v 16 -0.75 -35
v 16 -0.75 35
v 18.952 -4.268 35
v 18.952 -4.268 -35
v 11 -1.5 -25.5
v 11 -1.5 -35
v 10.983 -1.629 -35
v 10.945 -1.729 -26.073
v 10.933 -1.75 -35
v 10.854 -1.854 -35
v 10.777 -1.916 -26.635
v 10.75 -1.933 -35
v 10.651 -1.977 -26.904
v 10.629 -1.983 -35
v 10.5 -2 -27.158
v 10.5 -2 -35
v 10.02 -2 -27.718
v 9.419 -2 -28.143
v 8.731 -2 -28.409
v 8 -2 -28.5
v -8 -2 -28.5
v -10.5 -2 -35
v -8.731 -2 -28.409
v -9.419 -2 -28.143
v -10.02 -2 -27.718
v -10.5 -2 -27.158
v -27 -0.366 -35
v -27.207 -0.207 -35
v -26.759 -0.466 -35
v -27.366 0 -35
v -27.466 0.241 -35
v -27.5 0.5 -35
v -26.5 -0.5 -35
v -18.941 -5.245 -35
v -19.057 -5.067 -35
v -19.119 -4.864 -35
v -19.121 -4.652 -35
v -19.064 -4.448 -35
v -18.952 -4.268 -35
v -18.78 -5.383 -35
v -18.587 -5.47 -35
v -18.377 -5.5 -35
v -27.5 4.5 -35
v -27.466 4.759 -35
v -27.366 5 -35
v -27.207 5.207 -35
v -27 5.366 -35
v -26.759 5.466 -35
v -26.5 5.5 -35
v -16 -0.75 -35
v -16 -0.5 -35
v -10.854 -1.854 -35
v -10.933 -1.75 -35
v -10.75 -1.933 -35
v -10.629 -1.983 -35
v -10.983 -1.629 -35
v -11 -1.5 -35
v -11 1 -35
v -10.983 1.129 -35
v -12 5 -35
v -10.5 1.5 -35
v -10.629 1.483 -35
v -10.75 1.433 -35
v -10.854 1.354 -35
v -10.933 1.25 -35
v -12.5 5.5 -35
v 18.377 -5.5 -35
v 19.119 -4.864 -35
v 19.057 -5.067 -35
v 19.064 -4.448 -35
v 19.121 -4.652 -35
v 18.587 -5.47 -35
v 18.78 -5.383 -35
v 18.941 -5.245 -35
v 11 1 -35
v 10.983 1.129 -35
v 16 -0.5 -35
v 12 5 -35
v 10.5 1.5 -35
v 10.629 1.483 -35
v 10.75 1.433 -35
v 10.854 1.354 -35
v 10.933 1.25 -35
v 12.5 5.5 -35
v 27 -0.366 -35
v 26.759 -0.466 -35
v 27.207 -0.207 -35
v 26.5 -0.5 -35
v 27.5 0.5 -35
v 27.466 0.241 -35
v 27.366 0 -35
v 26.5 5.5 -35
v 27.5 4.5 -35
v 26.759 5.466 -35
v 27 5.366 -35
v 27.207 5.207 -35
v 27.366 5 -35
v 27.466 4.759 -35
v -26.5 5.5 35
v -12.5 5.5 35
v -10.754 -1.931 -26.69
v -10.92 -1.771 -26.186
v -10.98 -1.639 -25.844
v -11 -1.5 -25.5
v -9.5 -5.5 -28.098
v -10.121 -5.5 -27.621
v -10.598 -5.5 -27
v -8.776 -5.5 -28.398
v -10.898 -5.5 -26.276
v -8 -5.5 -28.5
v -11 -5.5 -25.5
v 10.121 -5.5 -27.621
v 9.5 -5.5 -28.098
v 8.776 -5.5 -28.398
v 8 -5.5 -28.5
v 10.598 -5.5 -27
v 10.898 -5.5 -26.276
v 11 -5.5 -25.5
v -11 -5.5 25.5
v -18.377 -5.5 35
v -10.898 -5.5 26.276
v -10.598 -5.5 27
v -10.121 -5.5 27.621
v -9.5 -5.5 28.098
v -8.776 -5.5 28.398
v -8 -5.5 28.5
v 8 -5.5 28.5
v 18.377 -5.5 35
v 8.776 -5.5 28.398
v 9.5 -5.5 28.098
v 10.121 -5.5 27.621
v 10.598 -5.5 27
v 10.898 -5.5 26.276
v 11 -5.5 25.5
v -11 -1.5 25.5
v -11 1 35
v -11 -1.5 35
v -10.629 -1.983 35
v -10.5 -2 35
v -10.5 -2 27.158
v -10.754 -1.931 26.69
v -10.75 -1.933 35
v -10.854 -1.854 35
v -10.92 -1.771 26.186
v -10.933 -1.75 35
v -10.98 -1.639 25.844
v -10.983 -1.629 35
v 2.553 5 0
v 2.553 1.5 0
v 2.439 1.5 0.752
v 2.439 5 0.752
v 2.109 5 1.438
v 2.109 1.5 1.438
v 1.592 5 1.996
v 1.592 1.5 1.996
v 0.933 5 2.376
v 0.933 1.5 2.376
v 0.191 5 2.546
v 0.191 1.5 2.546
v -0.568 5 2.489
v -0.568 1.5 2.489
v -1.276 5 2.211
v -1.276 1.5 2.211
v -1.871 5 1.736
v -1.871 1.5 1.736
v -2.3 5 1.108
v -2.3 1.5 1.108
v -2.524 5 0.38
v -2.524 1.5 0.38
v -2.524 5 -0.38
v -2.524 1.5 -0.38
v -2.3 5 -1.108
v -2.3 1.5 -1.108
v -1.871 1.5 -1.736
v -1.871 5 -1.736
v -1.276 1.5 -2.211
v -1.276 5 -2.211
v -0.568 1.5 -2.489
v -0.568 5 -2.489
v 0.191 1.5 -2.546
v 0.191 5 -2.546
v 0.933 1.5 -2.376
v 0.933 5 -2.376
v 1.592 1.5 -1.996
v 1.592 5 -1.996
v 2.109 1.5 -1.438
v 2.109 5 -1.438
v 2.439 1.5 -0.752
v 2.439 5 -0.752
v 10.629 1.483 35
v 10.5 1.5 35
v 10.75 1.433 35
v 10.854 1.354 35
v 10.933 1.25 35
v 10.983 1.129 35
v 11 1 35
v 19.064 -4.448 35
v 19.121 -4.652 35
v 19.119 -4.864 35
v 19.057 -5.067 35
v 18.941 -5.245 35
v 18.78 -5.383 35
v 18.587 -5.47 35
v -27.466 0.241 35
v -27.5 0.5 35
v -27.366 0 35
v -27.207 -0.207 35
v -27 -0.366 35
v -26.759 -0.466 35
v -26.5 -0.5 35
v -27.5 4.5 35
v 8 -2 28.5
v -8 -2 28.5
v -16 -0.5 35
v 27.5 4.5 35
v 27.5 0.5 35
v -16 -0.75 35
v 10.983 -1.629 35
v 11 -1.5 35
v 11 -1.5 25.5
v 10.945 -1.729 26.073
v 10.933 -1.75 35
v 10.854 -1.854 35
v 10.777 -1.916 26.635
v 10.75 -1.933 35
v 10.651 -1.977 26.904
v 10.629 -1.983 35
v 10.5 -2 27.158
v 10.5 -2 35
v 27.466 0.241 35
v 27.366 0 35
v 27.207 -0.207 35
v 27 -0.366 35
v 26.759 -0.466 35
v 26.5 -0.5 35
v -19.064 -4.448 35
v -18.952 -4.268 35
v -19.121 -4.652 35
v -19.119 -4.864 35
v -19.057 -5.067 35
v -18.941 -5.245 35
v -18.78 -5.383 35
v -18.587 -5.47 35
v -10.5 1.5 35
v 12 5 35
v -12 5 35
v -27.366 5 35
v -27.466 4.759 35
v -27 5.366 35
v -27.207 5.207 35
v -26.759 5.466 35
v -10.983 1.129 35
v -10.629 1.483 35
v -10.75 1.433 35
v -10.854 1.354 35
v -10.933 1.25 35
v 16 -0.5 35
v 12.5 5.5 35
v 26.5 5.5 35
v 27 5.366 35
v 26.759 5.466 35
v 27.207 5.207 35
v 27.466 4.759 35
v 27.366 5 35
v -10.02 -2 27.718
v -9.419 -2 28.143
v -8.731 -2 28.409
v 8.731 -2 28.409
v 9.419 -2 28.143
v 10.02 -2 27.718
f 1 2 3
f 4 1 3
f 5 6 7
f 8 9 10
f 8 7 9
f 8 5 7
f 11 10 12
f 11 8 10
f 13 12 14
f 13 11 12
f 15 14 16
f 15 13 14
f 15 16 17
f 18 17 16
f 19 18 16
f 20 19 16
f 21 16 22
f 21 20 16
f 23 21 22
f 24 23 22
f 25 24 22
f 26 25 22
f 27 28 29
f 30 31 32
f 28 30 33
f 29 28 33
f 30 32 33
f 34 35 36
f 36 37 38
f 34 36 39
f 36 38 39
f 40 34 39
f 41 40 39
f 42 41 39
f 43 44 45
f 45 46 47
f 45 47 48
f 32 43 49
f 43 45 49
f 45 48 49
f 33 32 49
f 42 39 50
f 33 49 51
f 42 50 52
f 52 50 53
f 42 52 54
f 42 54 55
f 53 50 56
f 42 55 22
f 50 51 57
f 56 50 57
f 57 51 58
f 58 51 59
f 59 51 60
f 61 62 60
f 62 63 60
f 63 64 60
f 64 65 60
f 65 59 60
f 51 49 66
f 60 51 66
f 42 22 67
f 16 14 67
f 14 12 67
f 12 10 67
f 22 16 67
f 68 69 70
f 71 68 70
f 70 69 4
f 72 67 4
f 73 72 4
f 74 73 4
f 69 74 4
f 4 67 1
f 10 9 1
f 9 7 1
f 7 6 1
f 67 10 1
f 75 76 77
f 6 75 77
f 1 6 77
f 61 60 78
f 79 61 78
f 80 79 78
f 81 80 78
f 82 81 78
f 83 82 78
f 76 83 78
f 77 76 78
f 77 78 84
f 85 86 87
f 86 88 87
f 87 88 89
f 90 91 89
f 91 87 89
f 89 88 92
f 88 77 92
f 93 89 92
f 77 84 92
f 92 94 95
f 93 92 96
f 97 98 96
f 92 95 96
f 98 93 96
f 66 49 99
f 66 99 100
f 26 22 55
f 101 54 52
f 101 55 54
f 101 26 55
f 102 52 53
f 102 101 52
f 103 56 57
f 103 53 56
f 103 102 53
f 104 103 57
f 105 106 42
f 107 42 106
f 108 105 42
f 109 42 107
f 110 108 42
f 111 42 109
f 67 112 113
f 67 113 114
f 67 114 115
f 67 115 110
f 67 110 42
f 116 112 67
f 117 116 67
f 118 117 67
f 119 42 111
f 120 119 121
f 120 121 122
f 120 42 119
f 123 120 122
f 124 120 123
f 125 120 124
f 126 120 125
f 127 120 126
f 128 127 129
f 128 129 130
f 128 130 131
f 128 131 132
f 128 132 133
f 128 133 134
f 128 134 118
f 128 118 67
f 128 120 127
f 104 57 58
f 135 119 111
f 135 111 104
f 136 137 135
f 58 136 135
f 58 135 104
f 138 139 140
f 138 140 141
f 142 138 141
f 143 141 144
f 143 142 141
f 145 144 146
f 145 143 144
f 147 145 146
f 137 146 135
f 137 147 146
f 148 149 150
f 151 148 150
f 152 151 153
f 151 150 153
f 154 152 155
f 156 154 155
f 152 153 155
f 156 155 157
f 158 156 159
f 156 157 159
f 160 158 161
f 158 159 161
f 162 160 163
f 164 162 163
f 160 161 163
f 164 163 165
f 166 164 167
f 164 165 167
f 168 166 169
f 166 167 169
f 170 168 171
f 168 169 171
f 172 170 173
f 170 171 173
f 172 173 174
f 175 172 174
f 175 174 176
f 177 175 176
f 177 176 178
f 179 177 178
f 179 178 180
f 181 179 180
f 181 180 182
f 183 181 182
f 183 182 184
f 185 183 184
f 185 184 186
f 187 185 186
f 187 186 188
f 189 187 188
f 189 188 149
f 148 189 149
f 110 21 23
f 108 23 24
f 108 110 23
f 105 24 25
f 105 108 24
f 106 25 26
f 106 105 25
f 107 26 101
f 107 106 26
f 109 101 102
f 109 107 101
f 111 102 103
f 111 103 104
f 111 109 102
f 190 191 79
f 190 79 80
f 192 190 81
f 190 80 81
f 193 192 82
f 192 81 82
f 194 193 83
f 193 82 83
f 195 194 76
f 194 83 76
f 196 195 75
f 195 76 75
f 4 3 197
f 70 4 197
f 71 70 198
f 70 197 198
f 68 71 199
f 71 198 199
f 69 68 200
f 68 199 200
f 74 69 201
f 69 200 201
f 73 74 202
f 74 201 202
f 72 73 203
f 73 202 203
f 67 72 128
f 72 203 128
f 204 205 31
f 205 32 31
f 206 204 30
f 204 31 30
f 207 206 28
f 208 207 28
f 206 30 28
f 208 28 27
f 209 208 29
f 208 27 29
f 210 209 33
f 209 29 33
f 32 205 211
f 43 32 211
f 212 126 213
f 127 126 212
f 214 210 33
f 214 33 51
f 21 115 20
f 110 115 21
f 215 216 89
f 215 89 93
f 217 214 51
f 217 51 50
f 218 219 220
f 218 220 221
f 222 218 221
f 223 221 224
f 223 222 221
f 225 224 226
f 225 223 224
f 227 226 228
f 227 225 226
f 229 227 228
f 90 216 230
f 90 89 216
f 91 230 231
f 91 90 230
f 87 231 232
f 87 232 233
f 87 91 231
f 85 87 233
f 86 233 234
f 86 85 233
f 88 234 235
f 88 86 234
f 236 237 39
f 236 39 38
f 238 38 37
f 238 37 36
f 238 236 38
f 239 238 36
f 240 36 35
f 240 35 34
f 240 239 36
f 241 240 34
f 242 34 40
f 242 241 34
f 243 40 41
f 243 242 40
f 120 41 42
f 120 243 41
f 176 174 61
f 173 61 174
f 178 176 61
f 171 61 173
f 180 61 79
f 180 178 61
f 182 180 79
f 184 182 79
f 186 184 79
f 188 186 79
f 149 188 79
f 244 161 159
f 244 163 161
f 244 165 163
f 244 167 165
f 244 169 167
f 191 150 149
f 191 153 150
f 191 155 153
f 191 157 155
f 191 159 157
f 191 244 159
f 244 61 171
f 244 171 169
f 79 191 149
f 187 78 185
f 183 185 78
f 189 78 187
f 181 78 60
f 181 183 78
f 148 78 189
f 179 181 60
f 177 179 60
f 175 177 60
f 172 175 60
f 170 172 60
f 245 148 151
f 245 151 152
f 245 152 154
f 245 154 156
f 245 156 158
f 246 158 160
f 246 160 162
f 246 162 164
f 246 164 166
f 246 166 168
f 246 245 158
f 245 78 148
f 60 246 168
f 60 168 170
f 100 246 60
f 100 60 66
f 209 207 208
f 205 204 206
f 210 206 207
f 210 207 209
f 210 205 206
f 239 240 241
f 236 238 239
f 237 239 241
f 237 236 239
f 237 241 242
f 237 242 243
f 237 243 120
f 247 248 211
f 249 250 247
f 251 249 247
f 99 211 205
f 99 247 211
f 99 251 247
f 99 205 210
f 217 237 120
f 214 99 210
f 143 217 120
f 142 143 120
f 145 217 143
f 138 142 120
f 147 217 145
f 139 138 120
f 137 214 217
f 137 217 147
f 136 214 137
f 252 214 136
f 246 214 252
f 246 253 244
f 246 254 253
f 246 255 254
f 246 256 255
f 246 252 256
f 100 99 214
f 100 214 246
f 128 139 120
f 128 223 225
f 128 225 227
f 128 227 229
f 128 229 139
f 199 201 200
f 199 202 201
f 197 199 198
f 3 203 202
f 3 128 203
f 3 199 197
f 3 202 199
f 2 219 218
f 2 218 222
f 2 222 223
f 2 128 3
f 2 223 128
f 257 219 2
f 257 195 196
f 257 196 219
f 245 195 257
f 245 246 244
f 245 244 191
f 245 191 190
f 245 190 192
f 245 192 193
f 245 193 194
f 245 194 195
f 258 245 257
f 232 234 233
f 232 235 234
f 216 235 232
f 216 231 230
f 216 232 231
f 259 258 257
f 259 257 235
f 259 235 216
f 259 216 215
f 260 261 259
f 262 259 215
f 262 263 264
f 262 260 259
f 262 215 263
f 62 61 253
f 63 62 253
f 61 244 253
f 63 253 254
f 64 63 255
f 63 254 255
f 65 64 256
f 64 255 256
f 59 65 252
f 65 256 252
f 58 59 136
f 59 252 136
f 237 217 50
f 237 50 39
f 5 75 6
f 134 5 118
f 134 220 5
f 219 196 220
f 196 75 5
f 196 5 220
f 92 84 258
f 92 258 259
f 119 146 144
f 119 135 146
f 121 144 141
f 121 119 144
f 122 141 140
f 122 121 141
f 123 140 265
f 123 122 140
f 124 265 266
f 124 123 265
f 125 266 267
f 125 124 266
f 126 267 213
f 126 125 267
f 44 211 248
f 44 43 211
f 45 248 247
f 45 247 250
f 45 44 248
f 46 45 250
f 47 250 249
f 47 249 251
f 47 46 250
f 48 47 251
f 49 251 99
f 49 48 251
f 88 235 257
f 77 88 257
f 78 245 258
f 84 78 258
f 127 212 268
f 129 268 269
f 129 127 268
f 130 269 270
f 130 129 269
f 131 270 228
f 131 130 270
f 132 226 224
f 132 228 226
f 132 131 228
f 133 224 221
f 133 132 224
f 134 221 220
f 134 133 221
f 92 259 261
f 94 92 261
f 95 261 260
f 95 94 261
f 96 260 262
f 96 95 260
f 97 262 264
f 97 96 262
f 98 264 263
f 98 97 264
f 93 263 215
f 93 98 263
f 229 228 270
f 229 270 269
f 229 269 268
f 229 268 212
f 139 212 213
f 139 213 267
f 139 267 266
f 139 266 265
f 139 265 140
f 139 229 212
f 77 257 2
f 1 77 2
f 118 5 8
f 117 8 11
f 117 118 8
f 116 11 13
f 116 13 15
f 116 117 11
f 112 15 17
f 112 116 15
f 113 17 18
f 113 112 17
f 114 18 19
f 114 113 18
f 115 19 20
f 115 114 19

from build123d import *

# Parameters (mm, degrees)
SKETCH1_W           = 55
SKETCH1_H           = 11
BOSS_EXTRUDE1_DEPTH = 35
CUT_EXTRUDE1_DEPTH  = 71
FILLET1_R           = 1
CUT_EXTRUDE2_DEPTH  = 71
CUT_EXTRUDE3_DEPTH  = 71
CUT_EXTRUDE4_DEPTH  = 7
FILLET2_R           = 0.5
SKETCH6_R           = 2.5527
CUT_EXTRUDE5_DEPTH  = 5


with BuildPart() as part:
    # Sketch1 → Boss-Extrude1 (new body, symmetric)
    with BuildSketch(Plane.XY):
        Rectangle(SKETCH1_W, SKETCH1_H)
    extrude(amount=BOSS_EXTRUDE1_DEPTH, both=True)

    # Sketch2 → Cut-Extrude1 (cut, through all)
    with BuildSketch(Plane.XY.offset(35)):
        with BuildLine():
            Line((-27.5, -0.5), (-16, -0.5))
            Line((-16, -0.5), (-16, -0.75))
            Line((-16, -0.75), (-18.95187639, -4.267909293))
            ThreePointArc((-18.95187639, -4.267909293), (-19.057073898, -5.066963696), (-18.377343058, -5.5))
            Line((-18.377343058, -5.5), (-27.5, -5.5))
            Line((-27.5, -5.5), (-27.5, -0.5))
        make_face()
    cut_extrude1 = extrude(amount=-CUT_EXTRUDE1_DEPTH, mode=Mode.SUBTRACT)

    # Mirror1: Cut-Extrude1 across plane
    add(cut_extrude1.mirror(Plane(origin=(0, 0, 0), x_dir=(0, 0, 1), z_dir=(1, 0, 0))), mode=Mode.SUBTRACT)

    # Fillet1
    fillet1_edges = [part.edges().sort_by_distance(p)[0] for p in [
        (-27.5, -0.5, 0),
        (27.5, -0.5, 0),
        (-27.5, 5.5, 0),
        (27.5, 5.5, 0),
    ]]
    fillet(fillet1_edges, radius=FILLET1_R)

    # Sketch3 → Cut-Extrude2 (cut, through all)
    with BuildSketch(Plane.XY.offset(35)):
        Polygon((-12.5, 5.5), (0, 5.5), (0, 5), (-12, 5), align=None)
    cut_extrude2 = extrude(amount=-CUT_EXTRUDE2_DEPTH, mode=Mode.SUBTRACT)

    # Mirror2: Cut-Extrude2 across plane
    add(cut_extrude2.mirror(Plane(origin=(0, 0, 0), x_dir=(0, 0, 1), z_dir=(1, 0, 0))), mode=Mode.SUBTRACT)

    # Sketch4 → Cut-Extrude3 (cut, through all)
    with BuildSketch(Plane.XY.offset(35)):
        with BuildLine():
            Line((-11, 1.5), (11, 1.5))
            Line((11, 1.5), (11, -1.5))
            ThreePointArc((11, -1.5), (10.853553391, -1.853553391), (10.5, -2))
            Line((10.5, -2), (-10.5, -2))
            ThreePointArc((-10.5, -2), (-10.853553391, -1.853553391), (-11, -1.5))
            Line((-11, -1.5), (-11, 1.5))
        make_face()
    extrude(amount=-CUT_EXTRUDE3_DEPTH, mode=Mode.SUBTRACT)

    # Sketch5 → Cut-Extrude4 (cut)
    with BuildSketch(Plane.XZ.offset(5.5)):
        with BuildLine():
            Line((-8, 28.5), (8, 28.5))
            ThreePointArc((8, 28.5), (10.121320344, 27.621320344), (11, 25.5))
            Line((11, 25.5), (11, -25.5))
            ThreePointArc((11, -25.5), (10.121320344, -27.621320344), (8, -28.5))
            Line((8, -28.5), (-8, -28.5))
            ThreePointArc((-8, -28.5), (-10.121320344, -27.621320344), (-11, -25.5))
            Line((-11, -25.5), (-11, 25.5))
            ThreePointArc((-11, 25.5), (-10.121320344, 27.621320344), (-8, 28.5))
        make_face()
    extrude(amount=-CUT_EXTRUDE4_DEPTH, mode=Mode.SUBTRACT)

    # Fillet2
    fillet2_edges = [part.edges().sort_by_distance(p)[0] for p in [
        (-11, 1.5, 0),
        (11, 1.5, 0),
    ]]
    fillet(fillet2_edges, radius=FILLET2_R)

    # Sketch6 → Cut-Extrude5 (cut, through all)
    with BuildSketch(Plane.XZ.offset(-1.5)):
        Circle(SKETCH6_R)
    extrude(amount=-CUT_EXTRUDE5_DEPTH, mode=Mode.SUBTRACT)


solid = part.part
